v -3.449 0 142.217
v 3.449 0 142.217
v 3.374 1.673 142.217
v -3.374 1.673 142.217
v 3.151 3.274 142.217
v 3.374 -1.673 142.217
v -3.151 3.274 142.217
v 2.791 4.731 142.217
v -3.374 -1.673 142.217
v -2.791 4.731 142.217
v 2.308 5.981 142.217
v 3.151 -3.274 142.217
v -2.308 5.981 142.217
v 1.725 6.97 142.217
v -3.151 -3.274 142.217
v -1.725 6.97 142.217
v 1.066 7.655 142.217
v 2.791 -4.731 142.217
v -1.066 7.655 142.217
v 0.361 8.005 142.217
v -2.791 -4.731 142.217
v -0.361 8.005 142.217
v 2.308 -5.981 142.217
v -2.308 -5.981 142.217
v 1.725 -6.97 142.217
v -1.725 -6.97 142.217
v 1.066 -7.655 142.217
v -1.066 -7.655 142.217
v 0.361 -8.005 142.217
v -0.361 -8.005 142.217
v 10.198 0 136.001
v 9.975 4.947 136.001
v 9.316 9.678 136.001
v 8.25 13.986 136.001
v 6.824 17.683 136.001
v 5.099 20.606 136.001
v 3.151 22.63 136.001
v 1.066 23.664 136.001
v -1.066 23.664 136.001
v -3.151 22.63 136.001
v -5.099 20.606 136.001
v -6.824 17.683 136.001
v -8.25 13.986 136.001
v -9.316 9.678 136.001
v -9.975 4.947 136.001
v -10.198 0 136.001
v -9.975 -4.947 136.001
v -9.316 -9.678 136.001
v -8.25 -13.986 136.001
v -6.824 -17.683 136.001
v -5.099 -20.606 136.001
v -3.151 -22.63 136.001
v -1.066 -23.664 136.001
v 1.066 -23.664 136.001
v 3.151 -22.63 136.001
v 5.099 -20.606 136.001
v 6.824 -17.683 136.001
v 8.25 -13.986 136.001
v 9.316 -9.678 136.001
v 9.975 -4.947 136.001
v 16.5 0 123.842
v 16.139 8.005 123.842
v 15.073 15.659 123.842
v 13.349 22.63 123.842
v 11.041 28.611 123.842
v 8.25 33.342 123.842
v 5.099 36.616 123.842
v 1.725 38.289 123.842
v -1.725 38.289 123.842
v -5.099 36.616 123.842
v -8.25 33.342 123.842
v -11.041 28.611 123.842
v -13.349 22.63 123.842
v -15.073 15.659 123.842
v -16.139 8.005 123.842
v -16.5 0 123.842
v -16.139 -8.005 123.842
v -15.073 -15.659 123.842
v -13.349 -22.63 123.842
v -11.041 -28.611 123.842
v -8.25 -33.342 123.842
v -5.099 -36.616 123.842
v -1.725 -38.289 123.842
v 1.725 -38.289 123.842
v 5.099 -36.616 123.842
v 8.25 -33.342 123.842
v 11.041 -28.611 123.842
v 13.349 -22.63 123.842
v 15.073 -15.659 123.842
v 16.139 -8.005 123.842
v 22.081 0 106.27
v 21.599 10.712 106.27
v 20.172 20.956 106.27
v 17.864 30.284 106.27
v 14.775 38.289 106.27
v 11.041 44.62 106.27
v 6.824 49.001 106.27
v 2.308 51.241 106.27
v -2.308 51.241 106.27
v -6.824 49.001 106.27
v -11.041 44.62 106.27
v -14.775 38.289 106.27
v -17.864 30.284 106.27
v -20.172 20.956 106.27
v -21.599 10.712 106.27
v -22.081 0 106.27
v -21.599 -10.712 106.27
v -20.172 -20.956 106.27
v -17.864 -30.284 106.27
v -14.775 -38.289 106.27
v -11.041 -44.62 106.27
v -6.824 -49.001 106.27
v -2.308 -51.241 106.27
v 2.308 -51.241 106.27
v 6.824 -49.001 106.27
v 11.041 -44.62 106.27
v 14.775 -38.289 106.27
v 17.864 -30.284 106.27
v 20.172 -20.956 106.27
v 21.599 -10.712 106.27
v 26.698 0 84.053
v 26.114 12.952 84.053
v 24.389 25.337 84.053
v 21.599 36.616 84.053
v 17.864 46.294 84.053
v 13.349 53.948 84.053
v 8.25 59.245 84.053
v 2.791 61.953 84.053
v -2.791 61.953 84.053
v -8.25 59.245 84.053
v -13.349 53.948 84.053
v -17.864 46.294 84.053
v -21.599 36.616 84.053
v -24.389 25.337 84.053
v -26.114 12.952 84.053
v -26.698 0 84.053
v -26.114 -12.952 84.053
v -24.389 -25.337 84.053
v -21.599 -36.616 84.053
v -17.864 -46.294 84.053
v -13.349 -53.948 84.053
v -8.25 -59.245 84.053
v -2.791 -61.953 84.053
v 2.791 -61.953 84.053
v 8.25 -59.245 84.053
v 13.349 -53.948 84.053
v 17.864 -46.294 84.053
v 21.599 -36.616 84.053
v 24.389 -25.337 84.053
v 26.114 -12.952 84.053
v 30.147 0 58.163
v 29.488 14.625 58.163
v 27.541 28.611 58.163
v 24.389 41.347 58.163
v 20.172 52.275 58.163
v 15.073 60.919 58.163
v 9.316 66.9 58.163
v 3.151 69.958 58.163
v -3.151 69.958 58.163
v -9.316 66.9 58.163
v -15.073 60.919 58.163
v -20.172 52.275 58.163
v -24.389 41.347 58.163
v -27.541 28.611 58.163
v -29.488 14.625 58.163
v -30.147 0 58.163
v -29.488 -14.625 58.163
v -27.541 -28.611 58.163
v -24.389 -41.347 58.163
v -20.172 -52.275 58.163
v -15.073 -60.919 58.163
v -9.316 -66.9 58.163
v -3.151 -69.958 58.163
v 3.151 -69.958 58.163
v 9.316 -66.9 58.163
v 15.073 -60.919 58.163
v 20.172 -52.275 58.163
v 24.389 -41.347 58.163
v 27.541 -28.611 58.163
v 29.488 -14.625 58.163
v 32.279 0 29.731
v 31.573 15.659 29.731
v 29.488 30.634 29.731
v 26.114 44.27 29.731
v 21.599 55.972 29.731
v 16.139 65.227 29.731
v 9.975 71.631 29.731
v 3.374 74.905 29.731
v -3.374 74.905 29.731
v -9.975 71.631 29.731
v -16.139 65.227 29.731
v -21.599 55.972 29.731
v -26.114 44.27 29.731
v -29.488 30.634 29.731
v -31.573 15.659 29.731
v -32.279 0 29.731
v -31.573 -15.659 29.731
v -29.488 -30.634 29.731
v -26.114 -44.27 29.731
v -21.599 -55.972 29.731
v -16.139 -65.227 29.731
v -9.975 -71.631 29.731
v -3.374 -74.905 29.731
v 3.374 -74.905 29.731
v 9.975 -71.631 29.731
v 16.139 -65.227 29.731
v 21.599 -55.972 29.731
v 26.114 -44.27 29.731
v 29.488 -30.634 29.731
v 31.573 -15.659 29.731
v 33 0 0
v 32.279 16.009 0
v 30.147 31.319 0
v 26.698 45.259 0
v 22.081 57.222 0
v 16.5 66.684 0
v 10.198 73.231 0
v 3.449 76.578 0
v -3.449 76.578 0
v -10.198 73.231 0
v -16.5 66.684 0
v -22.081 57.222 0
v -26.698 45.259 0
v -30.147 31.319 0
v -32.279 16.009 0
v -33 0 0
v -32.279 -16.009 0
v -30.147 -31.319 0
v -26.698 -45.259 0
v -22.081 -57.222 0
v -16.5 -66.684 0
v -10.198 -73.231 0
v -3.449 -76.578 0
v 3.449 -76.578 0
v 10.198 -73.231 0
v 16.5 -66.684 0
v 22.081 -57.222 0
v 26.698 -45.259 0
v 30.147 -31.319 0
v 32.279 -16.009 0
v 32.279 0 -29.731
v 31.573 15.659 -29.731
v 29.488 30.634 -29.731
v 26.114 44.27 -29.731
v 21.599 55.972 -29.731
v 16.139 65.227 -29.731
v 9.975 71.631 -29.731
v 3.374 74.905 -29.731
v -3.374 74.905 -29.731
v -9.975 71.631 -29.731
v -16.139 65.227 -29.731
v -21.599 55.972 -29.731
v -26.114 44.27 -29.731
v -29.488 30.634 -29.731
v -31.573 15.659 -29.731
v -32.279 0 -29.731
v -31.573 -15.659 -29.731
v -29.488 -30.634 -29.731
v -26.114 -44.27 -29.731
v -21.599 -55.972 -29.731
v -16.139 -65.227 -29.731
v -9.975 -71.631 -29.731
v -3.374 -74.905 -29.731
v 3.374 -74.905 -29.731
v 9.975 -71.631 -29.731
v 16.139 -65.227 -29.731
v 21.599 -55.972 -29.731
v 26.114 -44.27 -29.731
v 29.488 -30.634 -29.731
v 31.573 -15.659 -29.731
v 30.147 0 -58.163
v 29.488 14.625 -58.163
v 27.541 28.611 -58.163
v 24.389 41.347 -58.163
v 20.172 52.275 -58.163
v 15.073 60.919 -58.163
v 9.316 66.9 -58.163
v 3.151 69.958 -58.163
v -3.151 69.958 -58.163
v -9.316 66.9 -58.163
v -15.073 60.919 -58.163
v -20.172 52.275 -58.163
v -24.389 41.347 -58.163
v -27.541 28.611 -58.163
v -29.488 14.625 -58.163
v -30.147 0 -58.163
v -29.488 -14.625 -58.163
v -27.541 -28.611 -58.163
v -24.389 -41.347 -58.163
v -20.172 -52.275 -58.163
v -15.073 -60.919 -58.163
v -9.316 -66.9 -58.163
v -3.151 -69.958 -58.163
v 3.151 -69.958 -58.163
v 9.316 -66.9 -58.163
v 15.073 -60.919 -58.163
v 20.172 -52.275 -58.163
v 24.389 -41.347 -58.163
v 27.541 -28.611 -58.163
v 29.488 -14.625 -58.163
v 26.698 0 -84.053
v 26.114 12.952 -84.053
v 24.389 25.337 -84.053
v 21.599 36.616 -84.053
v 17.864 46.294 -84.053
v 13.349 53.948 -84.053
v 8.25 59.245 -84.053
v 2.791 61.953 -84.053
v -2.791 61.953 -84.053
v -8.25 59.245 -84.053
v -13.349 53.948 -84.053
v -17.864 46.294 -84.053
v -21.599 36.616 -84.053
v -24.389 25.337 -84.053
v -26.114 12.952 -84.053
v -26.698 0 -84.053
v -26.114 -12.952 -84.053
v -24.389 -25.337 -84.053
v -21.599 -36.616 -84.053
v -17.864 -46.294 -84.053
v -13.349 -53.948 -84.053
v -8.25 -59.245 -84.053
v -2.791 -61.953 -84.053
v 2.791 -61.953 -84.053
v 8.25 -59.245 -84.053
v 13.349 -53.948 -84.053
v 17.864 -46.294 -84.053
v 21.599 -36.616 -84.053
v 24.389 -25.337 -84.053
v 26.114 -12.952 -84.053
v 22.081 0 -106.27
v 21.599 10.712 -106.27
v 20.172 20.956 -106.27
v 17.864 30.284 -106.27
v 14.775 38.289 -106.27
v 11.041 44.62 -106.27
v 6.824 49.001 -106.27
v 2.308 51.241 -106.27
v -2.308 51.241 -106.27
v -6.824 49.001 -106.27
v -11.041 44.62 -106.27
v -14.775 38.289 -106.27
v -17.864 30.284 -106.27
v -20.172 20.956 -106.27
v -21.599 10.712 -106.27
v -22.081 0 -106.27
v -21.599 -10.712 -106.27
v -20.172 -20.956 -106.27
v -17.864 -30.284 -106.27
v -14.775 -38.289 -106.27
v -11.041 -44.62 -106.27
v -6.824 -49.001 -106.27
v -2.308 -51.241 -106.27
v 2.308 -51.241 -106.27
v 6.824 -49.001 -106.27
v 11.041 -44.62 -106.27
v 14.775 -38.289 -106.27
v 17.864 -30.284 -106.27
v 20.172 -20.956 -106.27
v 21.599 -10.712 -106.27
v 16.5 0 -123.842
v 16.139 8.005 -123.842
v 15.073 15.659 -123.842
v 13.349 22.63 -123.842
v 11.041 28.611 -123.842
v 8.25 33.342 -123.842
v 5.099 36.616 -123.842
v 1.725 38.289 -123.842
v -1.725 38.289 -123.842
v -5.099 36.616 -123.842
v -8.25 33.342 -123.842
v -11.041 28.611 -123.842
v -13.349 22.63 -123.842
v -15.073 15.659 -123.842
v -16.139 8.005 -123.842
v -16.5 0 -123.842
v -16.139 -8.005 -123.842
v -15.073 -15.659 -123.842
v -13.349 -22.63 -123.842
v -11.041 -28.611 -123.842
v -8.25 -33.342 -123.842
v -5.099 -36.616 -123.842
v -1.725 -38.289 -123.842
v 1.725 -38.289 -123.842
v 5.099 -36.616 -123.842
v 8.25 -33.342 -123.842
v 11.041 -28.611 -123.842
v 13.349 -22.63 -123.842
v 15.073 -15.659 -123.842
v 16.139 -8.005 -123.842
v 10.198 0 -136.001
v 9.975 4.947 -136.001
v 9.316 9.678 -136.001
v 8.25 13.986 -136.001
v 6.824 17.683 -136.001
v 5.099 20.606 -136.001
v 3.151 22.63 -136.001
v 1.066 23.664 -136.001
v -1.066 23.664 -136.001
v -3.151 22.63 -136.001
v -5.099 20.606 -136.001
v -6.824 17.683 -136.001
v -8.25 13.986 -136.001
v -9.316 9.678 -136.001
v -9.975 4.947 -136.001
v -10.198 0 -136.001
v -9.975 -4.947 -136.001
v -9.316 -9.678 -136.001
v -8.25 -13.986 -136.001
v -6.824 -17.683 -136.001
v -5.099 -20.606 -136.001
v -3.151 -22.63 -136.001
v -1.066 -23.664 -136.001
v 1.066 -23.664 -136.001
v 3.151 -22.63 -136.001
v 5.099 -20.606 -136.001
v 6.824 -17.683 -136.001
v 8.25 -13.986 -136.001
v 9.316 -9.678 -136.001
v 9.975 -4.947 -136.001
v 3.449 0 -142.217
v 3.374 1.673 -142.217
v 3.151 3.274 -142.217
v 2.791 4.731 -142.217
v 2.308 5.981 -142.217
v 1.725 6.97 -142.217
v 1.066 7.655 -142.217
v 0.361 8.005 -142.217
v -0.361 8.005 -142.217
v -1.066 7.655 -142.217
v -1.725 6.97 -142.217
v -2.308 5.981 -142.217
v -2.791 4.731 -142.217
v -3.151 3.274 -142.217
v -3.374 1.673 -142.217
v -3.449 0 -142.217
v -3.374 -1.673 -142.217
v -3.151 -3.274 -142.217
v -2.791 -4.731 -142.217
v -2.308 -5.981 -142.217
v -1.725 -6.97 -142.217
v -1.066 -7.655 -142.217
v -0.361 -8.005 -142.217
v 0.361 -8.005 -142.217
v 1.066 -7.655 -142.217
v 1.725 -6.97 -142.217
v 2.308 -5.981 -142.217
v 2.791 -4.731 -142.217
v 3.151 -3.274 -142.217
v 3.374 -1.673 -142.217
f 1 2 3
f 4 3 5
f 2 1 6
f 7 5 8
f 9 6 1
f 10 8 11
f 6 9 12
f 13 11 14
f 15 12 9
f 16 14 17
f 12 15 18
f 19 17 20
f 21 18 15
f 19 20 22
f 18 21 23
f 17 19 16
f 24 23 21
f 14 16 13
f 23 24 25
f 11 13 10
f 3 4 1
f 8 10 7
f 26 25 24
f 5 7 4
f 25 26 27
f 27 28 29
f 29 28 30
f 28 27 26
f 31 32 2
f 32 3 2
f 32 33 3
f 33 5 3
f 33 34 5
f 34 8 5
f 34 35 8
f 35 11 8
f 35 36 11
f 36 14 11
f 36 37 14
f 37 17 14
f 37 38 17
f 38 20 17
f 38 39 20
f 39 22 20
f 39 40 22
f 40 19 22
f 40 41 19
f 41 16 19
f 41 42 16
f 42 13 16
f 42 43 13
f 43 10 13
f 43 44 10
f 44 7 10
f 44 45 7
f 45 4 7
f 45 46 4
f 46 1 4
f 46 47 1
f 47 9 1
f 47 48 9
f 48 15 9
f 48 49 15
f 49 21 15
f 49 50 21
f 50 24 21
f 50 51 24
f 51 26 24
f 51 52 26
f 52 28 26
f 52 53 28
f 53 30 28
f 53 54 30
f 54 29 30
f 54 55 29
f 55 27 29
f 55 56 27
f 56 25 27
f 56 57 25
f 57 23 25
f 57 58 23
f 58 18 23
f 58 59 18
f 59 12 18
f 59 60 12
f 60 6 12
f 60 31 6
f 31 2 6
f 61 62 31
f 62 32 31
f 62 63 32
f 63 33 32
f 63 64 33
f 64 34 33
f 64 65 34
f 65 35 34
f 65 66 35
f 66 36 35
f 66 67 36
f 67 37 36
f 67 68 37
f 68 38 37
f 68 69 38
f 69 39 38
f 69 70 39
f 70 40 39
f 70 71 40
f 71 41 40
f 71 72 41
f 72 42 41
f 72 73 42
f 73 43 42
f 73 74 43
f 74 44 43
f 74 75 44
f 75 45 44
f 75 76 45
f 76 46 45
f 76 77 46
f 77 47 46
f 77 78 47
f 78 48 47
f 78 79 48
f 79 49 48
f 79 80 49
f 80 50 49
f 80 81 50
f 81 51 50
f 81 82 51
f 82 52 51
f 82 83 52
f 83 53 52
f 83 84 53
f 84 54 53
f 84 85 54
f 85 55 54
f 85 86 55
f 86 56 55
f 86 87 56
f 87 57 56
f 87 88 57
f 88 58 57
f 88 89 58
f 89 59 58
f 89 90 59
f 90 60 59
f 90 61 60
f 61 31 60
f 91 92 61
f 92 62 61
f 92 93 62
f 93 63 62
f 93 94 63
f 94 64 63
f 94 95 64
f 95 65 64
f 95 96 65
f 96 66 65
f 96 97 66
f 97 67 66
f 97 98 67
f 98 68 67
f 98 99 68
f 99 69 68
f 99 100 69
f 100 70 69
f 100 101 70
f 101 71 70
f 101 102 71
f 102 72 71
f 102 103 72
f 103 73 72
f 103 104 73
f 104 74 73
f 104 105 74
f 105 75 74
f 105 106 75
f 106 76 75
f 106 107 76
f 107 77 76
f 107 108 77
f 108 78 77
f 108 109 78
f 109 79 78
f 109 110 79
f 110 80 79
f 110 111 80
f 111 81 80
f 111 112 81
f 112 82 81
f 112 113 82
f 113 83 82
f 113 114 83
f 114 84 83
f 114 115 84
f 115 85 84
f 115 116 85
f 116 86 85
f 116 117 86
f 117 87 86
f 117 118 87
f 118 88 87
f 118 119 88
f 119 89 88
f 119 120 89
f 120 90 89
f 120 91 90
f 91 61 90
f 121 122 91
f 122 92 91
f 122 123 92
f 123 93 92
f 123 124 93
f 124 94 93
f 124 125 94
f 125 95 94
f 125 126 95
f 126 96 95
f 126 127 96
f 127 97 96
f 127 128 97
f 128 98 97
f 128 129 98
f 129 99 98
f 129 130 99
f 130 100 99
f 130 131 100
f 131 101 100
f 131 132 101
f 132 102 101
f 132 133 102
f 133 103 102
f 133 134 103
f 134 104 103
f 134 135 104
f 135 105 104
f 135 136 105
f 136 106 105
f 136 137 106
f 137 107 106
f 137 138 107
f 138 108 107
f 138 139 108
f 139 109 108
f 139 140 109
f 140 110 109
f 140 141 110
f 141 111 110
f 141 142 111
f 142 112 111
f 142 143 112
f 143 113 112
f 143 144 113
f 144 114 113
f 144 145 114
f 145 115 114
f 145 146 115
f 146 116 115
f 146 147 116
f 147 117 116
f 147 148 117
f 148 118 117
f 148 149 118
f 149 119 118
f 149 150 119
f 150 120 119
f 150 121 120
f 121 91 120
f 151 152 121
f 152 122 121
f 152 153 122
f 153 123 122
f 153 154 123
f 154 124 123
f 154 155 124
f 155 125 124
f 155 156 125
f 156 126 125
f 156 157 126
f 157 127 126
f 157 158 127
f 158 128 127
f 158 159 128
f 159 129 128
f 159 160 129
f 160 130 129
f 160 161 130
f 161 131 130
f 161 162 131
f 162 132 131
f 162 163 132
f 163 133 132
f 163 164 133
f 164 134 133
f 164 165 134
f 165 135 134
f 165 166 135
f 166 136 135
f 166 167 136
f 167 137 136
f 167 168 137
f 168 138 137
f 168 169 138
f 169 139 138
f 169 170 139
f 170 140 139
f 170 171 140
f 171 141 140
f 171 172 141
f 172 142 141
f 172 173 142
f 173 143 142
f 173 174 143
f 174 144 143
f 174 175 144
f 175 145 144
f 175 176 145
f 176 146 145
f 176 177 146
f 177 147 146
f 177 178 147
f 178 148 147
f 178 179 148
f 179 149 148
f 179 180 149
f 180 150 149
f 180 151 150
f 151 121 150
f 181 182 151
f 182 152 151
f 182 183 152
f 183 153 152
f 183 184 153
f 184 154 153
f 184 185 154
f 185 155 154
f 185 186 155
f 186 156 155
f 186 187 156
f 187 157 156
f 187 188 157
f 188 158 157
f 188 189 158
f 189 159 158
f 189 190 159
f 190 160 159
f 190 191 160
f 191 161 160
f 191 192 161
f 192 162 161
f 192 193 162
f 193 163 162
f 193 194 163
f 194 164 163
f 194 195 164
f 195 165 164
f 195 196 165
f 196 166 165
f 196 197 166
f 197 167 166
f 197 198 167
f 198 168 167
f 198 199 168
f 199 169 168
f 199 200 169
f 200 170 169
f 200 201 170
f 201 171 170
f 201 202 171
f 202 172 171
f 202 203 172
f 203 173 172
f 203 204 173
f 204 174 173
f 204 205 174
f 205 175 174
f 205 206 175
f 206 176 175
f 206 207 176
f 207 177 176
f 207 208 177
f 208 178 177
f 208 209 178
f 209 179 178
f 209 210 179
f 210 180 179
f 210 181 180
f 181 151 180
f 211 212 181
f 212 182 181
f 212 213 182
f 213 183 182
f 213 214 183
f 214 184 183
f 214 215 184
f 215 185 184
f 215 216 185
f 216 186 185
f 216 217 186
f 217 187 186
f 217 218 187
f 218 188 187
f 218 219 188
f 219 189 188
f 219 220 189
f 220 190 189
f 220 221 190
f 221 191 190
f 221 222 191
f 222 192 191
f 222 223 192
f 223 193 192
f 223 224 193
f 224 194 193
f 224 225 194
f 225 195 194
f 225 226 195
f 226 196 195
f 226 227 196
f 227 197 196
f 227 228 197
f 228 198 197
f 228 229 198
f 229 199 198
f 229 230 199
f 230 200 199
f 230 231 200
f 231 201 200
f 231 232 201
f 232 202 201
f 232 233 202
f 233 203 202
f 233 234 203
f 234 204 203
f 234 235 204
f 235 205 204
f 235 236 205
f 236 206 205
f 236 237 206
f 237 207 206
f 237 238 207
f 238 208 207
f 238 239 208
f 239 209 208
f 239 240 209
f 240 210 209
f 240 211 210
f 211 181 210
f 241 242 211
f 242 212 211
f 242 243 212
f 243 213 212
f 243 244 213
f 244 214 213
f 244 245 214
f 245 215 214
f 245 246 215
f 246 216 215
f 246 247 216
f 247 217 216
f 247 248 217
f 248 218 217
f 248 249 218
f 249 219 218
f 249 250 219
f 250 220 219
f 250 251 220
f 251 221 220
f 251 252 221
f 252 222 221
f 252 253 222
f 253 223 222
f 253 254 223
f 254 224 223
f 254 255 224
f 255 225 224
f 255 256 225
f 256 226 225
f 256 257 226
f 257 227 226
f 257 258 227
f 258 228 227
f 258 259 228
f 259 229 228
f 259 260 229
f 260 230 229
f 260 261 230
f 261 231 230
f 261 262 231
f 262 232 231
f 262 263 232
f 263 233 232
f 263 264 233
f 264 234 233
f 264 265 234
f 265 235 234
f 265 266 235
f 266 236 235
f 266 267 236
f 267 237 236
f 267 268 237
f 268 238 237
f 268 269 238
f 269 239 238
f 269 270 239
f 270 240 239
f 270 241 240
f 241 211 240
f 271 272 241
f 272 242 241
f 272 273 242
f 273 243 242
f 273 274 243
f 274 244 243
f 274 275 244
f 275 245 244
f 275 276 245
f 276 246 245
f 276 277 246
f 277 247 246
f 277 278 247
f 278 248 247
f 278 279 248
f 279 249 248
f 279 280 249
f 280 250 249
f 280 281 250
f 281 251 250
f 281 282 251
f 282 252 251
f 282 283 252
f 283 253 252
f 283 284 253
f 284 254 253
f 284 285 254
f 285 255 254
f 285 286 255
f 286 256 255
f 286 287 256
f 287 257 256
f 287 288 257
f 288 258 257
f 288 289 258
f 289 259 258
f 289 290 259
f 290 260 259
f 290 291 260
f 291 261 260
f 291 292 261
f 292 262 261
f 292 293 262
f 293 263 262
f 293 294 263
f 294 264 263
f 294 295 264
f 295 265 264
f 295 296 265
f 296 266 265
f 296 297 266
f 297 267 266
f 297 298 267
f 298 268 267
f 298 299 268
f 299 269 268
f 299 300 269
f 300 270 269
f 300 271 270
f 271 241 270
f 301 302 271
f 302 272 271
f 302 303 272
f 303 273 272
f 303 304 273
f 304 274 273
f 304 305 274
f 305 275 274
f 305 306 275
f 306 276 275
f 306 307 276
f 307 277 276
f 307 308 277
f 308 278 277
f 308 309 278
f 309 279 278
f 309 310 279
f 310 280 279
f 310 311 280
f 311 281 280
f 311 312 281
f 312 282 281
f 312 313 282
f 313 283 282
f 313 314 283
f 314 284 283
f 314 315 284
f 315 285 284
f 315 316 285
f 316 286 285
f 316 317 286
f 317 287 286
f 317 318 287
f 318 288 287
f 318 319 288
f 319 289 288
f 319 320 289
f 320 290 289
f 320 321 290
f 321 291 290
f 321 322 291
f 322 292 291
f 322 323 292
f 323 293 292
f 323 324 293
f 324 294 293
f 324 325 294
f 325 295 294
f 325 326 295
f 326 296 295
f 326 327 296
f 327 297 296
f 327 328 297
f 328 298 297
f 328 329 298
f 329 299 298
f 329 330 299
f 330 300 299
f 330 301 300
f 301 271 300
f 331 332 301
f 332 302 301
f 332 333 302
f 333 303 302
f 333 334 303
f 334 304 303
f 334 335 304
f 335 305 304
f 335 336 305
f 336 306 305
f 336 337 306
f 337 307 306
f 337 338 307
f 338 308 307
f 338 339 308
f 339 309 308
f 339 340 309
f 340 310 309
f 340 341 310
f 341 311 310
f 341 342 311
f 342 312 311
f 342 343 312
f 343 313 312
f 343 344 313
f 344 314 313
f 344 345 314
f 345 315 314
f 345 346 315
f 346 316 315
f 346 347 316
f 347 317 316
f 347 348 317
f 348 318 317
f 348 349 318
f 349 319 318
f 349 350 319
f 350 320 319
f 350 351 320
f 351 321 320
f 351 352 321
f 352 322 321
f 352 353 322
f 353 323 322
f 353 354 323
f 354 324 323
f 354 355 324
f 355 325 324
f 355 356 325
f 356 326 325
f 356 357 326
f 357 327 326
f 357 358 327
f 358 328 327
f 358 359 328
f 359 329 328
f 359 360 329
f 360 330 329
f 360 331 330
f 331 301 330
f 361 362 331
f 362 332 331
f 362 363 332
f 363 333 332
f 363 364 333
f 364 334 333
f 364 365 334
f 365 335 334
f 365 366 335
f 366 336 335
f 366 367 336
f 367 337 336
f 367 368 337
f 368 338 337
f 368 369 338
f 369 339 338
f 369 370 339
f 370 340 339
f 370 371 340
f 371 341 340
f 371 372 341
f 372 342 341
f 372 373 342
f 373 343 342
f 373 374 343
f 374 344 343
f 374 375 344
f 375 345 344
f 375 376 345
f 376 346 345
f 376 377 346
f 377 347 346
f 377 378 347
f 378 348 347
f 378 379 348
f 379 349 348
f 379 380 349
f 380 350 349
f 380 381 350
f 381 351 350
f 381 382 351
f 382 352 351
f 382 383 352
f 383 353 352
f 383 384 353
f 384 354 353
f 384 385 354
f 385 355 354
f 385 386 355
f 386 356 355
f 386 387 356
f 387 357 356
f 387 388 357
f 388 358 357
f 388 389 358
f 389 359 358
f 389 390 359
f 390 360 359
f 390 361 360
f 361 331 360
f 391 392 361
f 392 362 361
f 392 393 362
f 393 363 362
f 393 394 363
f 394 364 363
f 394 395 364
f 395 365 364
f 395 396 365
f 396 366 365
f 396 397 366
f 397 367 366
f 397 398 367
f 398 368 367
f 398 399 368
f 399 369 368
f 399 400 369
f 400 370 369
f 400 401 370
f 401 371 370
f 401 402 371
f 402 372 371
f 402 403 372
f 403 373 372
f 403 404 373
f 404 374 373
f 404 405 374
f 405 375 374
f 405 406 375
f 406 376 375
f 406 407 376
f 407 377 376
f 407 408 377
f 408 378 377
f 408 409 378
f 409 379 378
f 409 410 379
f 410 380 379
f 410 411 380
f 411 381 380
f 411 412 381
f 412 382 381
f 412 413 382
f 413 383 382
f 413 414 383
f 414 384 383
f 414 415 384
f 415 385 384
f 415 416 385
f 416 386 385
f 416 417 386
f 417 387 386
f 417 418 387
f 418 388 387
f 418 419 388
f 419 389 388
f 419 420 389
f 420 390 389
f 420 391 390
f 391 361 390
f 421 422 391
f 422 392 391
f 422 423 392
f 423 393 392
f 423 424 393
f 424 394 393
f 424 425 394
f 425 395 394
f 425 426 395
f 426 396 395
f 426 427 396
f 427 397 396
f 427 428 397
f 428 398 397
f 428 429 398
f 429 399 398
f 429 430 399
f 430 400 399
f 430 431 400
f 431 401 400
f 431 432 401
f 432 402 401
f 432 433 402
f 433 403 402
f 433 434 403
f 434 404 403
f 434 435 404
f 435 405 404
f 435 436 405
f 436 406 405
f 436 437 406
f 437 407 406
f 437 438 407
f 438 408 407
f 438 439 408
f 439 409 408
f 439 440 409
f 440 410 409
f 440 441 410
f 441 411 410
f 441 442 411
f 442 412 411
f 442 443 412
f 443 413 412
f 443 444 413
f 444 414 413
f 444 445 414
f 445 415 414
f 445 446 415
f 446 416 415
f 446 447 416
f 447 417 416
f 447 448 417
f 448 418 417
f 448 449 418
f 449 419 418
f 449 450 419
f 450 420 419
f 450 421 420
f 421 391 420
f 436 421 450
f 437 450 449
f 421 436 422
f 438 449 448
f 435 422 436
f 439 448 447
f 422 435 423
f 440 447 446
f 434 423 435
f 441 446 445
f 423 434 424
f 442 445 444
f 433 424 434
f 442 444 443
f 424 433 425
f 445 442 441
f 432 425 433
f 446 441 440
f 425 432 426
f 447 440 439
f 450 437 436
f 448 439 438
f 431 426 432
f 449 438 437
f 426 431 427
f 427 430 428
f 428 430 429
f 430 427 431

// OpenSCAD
// Generated by SolidPython 1.0.1 on 2020-07-29 00:46:45


scale(v = [3, 7, 13]) {
	sphere(r = 11);
}
/***********************************************
*********      SolidPython code:      **********
************************************************
 
# import packages: SolidPython
from solid import *
from solid.utils import *
from itertools import chain, combinations, permutations


class Resize:

    def __init__(self, scad_file):
        self.scad_file = scad_file
        #self.scad_file = import_scad(scad_file)
        # cone/cylinder param:
        self.r1 = 0
        self.r2 = 0
        self.h = 0
        # rectangular prism param:
        self.w = 0
        self.l = 0
        # ellipse param:
        self.r = 0

    # import OpenScad code (file name corresponds to shape)


    # classify shape + parameters
    def assign(self, param1, param2, param3):
        if self.scad_file == 'cone.scad':
            self.r1 = param1
            self.r2 = param2
            self.h = param3
        elif self.scad_file == 'cylinder.scad':
            self.r1 = param1
            self.r2 = param2
            self.h = param3
        elif self.scad_file == 'rectangularPrism.scad':
            self.h = param1
            self.l = param2
            self.w = param3
        else:
            self.r = param1
            self.h = param2

    # resize parameters
    def iterate(self):
        x = range(3, 20, 2)
        i = 1
        if self.scad_file == 'cone.scad':
            tempList = list(permutations(x, 2))
            for temp in tempList:
                param1 = temp[0]
                param2 = temp[1]
                filepath = 'produced_scad_files/' + 'cone' + str(param1) + '_' + str(param2) + '_' + '.scad'
                scad_render_to_file(cylinder(h=param1, r1=param2, r2=0), filepath)

        elif self.scad_file == 'cylinder.scad':
            tempList = list(permutations(x, 3))
            for temp in tempList:
                param1 = temp[0]
                param2 = temp[1]
                filepath = 'produced_scad_files/' + 'cylinder' + str(param1) + '_' + str(param2) + '_' + '.scad'
                scad_render_to_file(cylinder(h=param1, r1=param2, r2=param2), filepath)

        elif self.scad_file == 'rectangularPrism.scad':
            tempList = list(permutations(x, 3))
            for temp in tempList:
                param1 = temp[0]
                param2 = temp[1]
                param3 = temp[2]
                filepath = 'produced_scad_files/' + 'rectangularPrism' + str(param1) + '_' + str(param2) + '_' + str(
                    param3) + '.scad'
                scad_render_to_file(cube(size=(param1, param2, param3)), filepath)

        elif self.scad_file == 'ellipse.scad':
            tempList = list(permutations(x, 4))
            for temp in tempList:
                param1 = temp[0]
                param2 = temp[1]
                param3 = temp[2]
                param4 = temp[3]
                filepath = 'produced_scad_files/' + 'ellipse' + str(param1) + '_' + str(param2) + '_' + str(param3) + '_' + str(param4) + '.scad'
                scad_render_to_file(scale([param1, param2, param3])(sphere(r=param4)), filepath)

    def render_to_scadfile(self):
        scad_render_to_file(scad, 'example.scad') 
 
************************************************/
